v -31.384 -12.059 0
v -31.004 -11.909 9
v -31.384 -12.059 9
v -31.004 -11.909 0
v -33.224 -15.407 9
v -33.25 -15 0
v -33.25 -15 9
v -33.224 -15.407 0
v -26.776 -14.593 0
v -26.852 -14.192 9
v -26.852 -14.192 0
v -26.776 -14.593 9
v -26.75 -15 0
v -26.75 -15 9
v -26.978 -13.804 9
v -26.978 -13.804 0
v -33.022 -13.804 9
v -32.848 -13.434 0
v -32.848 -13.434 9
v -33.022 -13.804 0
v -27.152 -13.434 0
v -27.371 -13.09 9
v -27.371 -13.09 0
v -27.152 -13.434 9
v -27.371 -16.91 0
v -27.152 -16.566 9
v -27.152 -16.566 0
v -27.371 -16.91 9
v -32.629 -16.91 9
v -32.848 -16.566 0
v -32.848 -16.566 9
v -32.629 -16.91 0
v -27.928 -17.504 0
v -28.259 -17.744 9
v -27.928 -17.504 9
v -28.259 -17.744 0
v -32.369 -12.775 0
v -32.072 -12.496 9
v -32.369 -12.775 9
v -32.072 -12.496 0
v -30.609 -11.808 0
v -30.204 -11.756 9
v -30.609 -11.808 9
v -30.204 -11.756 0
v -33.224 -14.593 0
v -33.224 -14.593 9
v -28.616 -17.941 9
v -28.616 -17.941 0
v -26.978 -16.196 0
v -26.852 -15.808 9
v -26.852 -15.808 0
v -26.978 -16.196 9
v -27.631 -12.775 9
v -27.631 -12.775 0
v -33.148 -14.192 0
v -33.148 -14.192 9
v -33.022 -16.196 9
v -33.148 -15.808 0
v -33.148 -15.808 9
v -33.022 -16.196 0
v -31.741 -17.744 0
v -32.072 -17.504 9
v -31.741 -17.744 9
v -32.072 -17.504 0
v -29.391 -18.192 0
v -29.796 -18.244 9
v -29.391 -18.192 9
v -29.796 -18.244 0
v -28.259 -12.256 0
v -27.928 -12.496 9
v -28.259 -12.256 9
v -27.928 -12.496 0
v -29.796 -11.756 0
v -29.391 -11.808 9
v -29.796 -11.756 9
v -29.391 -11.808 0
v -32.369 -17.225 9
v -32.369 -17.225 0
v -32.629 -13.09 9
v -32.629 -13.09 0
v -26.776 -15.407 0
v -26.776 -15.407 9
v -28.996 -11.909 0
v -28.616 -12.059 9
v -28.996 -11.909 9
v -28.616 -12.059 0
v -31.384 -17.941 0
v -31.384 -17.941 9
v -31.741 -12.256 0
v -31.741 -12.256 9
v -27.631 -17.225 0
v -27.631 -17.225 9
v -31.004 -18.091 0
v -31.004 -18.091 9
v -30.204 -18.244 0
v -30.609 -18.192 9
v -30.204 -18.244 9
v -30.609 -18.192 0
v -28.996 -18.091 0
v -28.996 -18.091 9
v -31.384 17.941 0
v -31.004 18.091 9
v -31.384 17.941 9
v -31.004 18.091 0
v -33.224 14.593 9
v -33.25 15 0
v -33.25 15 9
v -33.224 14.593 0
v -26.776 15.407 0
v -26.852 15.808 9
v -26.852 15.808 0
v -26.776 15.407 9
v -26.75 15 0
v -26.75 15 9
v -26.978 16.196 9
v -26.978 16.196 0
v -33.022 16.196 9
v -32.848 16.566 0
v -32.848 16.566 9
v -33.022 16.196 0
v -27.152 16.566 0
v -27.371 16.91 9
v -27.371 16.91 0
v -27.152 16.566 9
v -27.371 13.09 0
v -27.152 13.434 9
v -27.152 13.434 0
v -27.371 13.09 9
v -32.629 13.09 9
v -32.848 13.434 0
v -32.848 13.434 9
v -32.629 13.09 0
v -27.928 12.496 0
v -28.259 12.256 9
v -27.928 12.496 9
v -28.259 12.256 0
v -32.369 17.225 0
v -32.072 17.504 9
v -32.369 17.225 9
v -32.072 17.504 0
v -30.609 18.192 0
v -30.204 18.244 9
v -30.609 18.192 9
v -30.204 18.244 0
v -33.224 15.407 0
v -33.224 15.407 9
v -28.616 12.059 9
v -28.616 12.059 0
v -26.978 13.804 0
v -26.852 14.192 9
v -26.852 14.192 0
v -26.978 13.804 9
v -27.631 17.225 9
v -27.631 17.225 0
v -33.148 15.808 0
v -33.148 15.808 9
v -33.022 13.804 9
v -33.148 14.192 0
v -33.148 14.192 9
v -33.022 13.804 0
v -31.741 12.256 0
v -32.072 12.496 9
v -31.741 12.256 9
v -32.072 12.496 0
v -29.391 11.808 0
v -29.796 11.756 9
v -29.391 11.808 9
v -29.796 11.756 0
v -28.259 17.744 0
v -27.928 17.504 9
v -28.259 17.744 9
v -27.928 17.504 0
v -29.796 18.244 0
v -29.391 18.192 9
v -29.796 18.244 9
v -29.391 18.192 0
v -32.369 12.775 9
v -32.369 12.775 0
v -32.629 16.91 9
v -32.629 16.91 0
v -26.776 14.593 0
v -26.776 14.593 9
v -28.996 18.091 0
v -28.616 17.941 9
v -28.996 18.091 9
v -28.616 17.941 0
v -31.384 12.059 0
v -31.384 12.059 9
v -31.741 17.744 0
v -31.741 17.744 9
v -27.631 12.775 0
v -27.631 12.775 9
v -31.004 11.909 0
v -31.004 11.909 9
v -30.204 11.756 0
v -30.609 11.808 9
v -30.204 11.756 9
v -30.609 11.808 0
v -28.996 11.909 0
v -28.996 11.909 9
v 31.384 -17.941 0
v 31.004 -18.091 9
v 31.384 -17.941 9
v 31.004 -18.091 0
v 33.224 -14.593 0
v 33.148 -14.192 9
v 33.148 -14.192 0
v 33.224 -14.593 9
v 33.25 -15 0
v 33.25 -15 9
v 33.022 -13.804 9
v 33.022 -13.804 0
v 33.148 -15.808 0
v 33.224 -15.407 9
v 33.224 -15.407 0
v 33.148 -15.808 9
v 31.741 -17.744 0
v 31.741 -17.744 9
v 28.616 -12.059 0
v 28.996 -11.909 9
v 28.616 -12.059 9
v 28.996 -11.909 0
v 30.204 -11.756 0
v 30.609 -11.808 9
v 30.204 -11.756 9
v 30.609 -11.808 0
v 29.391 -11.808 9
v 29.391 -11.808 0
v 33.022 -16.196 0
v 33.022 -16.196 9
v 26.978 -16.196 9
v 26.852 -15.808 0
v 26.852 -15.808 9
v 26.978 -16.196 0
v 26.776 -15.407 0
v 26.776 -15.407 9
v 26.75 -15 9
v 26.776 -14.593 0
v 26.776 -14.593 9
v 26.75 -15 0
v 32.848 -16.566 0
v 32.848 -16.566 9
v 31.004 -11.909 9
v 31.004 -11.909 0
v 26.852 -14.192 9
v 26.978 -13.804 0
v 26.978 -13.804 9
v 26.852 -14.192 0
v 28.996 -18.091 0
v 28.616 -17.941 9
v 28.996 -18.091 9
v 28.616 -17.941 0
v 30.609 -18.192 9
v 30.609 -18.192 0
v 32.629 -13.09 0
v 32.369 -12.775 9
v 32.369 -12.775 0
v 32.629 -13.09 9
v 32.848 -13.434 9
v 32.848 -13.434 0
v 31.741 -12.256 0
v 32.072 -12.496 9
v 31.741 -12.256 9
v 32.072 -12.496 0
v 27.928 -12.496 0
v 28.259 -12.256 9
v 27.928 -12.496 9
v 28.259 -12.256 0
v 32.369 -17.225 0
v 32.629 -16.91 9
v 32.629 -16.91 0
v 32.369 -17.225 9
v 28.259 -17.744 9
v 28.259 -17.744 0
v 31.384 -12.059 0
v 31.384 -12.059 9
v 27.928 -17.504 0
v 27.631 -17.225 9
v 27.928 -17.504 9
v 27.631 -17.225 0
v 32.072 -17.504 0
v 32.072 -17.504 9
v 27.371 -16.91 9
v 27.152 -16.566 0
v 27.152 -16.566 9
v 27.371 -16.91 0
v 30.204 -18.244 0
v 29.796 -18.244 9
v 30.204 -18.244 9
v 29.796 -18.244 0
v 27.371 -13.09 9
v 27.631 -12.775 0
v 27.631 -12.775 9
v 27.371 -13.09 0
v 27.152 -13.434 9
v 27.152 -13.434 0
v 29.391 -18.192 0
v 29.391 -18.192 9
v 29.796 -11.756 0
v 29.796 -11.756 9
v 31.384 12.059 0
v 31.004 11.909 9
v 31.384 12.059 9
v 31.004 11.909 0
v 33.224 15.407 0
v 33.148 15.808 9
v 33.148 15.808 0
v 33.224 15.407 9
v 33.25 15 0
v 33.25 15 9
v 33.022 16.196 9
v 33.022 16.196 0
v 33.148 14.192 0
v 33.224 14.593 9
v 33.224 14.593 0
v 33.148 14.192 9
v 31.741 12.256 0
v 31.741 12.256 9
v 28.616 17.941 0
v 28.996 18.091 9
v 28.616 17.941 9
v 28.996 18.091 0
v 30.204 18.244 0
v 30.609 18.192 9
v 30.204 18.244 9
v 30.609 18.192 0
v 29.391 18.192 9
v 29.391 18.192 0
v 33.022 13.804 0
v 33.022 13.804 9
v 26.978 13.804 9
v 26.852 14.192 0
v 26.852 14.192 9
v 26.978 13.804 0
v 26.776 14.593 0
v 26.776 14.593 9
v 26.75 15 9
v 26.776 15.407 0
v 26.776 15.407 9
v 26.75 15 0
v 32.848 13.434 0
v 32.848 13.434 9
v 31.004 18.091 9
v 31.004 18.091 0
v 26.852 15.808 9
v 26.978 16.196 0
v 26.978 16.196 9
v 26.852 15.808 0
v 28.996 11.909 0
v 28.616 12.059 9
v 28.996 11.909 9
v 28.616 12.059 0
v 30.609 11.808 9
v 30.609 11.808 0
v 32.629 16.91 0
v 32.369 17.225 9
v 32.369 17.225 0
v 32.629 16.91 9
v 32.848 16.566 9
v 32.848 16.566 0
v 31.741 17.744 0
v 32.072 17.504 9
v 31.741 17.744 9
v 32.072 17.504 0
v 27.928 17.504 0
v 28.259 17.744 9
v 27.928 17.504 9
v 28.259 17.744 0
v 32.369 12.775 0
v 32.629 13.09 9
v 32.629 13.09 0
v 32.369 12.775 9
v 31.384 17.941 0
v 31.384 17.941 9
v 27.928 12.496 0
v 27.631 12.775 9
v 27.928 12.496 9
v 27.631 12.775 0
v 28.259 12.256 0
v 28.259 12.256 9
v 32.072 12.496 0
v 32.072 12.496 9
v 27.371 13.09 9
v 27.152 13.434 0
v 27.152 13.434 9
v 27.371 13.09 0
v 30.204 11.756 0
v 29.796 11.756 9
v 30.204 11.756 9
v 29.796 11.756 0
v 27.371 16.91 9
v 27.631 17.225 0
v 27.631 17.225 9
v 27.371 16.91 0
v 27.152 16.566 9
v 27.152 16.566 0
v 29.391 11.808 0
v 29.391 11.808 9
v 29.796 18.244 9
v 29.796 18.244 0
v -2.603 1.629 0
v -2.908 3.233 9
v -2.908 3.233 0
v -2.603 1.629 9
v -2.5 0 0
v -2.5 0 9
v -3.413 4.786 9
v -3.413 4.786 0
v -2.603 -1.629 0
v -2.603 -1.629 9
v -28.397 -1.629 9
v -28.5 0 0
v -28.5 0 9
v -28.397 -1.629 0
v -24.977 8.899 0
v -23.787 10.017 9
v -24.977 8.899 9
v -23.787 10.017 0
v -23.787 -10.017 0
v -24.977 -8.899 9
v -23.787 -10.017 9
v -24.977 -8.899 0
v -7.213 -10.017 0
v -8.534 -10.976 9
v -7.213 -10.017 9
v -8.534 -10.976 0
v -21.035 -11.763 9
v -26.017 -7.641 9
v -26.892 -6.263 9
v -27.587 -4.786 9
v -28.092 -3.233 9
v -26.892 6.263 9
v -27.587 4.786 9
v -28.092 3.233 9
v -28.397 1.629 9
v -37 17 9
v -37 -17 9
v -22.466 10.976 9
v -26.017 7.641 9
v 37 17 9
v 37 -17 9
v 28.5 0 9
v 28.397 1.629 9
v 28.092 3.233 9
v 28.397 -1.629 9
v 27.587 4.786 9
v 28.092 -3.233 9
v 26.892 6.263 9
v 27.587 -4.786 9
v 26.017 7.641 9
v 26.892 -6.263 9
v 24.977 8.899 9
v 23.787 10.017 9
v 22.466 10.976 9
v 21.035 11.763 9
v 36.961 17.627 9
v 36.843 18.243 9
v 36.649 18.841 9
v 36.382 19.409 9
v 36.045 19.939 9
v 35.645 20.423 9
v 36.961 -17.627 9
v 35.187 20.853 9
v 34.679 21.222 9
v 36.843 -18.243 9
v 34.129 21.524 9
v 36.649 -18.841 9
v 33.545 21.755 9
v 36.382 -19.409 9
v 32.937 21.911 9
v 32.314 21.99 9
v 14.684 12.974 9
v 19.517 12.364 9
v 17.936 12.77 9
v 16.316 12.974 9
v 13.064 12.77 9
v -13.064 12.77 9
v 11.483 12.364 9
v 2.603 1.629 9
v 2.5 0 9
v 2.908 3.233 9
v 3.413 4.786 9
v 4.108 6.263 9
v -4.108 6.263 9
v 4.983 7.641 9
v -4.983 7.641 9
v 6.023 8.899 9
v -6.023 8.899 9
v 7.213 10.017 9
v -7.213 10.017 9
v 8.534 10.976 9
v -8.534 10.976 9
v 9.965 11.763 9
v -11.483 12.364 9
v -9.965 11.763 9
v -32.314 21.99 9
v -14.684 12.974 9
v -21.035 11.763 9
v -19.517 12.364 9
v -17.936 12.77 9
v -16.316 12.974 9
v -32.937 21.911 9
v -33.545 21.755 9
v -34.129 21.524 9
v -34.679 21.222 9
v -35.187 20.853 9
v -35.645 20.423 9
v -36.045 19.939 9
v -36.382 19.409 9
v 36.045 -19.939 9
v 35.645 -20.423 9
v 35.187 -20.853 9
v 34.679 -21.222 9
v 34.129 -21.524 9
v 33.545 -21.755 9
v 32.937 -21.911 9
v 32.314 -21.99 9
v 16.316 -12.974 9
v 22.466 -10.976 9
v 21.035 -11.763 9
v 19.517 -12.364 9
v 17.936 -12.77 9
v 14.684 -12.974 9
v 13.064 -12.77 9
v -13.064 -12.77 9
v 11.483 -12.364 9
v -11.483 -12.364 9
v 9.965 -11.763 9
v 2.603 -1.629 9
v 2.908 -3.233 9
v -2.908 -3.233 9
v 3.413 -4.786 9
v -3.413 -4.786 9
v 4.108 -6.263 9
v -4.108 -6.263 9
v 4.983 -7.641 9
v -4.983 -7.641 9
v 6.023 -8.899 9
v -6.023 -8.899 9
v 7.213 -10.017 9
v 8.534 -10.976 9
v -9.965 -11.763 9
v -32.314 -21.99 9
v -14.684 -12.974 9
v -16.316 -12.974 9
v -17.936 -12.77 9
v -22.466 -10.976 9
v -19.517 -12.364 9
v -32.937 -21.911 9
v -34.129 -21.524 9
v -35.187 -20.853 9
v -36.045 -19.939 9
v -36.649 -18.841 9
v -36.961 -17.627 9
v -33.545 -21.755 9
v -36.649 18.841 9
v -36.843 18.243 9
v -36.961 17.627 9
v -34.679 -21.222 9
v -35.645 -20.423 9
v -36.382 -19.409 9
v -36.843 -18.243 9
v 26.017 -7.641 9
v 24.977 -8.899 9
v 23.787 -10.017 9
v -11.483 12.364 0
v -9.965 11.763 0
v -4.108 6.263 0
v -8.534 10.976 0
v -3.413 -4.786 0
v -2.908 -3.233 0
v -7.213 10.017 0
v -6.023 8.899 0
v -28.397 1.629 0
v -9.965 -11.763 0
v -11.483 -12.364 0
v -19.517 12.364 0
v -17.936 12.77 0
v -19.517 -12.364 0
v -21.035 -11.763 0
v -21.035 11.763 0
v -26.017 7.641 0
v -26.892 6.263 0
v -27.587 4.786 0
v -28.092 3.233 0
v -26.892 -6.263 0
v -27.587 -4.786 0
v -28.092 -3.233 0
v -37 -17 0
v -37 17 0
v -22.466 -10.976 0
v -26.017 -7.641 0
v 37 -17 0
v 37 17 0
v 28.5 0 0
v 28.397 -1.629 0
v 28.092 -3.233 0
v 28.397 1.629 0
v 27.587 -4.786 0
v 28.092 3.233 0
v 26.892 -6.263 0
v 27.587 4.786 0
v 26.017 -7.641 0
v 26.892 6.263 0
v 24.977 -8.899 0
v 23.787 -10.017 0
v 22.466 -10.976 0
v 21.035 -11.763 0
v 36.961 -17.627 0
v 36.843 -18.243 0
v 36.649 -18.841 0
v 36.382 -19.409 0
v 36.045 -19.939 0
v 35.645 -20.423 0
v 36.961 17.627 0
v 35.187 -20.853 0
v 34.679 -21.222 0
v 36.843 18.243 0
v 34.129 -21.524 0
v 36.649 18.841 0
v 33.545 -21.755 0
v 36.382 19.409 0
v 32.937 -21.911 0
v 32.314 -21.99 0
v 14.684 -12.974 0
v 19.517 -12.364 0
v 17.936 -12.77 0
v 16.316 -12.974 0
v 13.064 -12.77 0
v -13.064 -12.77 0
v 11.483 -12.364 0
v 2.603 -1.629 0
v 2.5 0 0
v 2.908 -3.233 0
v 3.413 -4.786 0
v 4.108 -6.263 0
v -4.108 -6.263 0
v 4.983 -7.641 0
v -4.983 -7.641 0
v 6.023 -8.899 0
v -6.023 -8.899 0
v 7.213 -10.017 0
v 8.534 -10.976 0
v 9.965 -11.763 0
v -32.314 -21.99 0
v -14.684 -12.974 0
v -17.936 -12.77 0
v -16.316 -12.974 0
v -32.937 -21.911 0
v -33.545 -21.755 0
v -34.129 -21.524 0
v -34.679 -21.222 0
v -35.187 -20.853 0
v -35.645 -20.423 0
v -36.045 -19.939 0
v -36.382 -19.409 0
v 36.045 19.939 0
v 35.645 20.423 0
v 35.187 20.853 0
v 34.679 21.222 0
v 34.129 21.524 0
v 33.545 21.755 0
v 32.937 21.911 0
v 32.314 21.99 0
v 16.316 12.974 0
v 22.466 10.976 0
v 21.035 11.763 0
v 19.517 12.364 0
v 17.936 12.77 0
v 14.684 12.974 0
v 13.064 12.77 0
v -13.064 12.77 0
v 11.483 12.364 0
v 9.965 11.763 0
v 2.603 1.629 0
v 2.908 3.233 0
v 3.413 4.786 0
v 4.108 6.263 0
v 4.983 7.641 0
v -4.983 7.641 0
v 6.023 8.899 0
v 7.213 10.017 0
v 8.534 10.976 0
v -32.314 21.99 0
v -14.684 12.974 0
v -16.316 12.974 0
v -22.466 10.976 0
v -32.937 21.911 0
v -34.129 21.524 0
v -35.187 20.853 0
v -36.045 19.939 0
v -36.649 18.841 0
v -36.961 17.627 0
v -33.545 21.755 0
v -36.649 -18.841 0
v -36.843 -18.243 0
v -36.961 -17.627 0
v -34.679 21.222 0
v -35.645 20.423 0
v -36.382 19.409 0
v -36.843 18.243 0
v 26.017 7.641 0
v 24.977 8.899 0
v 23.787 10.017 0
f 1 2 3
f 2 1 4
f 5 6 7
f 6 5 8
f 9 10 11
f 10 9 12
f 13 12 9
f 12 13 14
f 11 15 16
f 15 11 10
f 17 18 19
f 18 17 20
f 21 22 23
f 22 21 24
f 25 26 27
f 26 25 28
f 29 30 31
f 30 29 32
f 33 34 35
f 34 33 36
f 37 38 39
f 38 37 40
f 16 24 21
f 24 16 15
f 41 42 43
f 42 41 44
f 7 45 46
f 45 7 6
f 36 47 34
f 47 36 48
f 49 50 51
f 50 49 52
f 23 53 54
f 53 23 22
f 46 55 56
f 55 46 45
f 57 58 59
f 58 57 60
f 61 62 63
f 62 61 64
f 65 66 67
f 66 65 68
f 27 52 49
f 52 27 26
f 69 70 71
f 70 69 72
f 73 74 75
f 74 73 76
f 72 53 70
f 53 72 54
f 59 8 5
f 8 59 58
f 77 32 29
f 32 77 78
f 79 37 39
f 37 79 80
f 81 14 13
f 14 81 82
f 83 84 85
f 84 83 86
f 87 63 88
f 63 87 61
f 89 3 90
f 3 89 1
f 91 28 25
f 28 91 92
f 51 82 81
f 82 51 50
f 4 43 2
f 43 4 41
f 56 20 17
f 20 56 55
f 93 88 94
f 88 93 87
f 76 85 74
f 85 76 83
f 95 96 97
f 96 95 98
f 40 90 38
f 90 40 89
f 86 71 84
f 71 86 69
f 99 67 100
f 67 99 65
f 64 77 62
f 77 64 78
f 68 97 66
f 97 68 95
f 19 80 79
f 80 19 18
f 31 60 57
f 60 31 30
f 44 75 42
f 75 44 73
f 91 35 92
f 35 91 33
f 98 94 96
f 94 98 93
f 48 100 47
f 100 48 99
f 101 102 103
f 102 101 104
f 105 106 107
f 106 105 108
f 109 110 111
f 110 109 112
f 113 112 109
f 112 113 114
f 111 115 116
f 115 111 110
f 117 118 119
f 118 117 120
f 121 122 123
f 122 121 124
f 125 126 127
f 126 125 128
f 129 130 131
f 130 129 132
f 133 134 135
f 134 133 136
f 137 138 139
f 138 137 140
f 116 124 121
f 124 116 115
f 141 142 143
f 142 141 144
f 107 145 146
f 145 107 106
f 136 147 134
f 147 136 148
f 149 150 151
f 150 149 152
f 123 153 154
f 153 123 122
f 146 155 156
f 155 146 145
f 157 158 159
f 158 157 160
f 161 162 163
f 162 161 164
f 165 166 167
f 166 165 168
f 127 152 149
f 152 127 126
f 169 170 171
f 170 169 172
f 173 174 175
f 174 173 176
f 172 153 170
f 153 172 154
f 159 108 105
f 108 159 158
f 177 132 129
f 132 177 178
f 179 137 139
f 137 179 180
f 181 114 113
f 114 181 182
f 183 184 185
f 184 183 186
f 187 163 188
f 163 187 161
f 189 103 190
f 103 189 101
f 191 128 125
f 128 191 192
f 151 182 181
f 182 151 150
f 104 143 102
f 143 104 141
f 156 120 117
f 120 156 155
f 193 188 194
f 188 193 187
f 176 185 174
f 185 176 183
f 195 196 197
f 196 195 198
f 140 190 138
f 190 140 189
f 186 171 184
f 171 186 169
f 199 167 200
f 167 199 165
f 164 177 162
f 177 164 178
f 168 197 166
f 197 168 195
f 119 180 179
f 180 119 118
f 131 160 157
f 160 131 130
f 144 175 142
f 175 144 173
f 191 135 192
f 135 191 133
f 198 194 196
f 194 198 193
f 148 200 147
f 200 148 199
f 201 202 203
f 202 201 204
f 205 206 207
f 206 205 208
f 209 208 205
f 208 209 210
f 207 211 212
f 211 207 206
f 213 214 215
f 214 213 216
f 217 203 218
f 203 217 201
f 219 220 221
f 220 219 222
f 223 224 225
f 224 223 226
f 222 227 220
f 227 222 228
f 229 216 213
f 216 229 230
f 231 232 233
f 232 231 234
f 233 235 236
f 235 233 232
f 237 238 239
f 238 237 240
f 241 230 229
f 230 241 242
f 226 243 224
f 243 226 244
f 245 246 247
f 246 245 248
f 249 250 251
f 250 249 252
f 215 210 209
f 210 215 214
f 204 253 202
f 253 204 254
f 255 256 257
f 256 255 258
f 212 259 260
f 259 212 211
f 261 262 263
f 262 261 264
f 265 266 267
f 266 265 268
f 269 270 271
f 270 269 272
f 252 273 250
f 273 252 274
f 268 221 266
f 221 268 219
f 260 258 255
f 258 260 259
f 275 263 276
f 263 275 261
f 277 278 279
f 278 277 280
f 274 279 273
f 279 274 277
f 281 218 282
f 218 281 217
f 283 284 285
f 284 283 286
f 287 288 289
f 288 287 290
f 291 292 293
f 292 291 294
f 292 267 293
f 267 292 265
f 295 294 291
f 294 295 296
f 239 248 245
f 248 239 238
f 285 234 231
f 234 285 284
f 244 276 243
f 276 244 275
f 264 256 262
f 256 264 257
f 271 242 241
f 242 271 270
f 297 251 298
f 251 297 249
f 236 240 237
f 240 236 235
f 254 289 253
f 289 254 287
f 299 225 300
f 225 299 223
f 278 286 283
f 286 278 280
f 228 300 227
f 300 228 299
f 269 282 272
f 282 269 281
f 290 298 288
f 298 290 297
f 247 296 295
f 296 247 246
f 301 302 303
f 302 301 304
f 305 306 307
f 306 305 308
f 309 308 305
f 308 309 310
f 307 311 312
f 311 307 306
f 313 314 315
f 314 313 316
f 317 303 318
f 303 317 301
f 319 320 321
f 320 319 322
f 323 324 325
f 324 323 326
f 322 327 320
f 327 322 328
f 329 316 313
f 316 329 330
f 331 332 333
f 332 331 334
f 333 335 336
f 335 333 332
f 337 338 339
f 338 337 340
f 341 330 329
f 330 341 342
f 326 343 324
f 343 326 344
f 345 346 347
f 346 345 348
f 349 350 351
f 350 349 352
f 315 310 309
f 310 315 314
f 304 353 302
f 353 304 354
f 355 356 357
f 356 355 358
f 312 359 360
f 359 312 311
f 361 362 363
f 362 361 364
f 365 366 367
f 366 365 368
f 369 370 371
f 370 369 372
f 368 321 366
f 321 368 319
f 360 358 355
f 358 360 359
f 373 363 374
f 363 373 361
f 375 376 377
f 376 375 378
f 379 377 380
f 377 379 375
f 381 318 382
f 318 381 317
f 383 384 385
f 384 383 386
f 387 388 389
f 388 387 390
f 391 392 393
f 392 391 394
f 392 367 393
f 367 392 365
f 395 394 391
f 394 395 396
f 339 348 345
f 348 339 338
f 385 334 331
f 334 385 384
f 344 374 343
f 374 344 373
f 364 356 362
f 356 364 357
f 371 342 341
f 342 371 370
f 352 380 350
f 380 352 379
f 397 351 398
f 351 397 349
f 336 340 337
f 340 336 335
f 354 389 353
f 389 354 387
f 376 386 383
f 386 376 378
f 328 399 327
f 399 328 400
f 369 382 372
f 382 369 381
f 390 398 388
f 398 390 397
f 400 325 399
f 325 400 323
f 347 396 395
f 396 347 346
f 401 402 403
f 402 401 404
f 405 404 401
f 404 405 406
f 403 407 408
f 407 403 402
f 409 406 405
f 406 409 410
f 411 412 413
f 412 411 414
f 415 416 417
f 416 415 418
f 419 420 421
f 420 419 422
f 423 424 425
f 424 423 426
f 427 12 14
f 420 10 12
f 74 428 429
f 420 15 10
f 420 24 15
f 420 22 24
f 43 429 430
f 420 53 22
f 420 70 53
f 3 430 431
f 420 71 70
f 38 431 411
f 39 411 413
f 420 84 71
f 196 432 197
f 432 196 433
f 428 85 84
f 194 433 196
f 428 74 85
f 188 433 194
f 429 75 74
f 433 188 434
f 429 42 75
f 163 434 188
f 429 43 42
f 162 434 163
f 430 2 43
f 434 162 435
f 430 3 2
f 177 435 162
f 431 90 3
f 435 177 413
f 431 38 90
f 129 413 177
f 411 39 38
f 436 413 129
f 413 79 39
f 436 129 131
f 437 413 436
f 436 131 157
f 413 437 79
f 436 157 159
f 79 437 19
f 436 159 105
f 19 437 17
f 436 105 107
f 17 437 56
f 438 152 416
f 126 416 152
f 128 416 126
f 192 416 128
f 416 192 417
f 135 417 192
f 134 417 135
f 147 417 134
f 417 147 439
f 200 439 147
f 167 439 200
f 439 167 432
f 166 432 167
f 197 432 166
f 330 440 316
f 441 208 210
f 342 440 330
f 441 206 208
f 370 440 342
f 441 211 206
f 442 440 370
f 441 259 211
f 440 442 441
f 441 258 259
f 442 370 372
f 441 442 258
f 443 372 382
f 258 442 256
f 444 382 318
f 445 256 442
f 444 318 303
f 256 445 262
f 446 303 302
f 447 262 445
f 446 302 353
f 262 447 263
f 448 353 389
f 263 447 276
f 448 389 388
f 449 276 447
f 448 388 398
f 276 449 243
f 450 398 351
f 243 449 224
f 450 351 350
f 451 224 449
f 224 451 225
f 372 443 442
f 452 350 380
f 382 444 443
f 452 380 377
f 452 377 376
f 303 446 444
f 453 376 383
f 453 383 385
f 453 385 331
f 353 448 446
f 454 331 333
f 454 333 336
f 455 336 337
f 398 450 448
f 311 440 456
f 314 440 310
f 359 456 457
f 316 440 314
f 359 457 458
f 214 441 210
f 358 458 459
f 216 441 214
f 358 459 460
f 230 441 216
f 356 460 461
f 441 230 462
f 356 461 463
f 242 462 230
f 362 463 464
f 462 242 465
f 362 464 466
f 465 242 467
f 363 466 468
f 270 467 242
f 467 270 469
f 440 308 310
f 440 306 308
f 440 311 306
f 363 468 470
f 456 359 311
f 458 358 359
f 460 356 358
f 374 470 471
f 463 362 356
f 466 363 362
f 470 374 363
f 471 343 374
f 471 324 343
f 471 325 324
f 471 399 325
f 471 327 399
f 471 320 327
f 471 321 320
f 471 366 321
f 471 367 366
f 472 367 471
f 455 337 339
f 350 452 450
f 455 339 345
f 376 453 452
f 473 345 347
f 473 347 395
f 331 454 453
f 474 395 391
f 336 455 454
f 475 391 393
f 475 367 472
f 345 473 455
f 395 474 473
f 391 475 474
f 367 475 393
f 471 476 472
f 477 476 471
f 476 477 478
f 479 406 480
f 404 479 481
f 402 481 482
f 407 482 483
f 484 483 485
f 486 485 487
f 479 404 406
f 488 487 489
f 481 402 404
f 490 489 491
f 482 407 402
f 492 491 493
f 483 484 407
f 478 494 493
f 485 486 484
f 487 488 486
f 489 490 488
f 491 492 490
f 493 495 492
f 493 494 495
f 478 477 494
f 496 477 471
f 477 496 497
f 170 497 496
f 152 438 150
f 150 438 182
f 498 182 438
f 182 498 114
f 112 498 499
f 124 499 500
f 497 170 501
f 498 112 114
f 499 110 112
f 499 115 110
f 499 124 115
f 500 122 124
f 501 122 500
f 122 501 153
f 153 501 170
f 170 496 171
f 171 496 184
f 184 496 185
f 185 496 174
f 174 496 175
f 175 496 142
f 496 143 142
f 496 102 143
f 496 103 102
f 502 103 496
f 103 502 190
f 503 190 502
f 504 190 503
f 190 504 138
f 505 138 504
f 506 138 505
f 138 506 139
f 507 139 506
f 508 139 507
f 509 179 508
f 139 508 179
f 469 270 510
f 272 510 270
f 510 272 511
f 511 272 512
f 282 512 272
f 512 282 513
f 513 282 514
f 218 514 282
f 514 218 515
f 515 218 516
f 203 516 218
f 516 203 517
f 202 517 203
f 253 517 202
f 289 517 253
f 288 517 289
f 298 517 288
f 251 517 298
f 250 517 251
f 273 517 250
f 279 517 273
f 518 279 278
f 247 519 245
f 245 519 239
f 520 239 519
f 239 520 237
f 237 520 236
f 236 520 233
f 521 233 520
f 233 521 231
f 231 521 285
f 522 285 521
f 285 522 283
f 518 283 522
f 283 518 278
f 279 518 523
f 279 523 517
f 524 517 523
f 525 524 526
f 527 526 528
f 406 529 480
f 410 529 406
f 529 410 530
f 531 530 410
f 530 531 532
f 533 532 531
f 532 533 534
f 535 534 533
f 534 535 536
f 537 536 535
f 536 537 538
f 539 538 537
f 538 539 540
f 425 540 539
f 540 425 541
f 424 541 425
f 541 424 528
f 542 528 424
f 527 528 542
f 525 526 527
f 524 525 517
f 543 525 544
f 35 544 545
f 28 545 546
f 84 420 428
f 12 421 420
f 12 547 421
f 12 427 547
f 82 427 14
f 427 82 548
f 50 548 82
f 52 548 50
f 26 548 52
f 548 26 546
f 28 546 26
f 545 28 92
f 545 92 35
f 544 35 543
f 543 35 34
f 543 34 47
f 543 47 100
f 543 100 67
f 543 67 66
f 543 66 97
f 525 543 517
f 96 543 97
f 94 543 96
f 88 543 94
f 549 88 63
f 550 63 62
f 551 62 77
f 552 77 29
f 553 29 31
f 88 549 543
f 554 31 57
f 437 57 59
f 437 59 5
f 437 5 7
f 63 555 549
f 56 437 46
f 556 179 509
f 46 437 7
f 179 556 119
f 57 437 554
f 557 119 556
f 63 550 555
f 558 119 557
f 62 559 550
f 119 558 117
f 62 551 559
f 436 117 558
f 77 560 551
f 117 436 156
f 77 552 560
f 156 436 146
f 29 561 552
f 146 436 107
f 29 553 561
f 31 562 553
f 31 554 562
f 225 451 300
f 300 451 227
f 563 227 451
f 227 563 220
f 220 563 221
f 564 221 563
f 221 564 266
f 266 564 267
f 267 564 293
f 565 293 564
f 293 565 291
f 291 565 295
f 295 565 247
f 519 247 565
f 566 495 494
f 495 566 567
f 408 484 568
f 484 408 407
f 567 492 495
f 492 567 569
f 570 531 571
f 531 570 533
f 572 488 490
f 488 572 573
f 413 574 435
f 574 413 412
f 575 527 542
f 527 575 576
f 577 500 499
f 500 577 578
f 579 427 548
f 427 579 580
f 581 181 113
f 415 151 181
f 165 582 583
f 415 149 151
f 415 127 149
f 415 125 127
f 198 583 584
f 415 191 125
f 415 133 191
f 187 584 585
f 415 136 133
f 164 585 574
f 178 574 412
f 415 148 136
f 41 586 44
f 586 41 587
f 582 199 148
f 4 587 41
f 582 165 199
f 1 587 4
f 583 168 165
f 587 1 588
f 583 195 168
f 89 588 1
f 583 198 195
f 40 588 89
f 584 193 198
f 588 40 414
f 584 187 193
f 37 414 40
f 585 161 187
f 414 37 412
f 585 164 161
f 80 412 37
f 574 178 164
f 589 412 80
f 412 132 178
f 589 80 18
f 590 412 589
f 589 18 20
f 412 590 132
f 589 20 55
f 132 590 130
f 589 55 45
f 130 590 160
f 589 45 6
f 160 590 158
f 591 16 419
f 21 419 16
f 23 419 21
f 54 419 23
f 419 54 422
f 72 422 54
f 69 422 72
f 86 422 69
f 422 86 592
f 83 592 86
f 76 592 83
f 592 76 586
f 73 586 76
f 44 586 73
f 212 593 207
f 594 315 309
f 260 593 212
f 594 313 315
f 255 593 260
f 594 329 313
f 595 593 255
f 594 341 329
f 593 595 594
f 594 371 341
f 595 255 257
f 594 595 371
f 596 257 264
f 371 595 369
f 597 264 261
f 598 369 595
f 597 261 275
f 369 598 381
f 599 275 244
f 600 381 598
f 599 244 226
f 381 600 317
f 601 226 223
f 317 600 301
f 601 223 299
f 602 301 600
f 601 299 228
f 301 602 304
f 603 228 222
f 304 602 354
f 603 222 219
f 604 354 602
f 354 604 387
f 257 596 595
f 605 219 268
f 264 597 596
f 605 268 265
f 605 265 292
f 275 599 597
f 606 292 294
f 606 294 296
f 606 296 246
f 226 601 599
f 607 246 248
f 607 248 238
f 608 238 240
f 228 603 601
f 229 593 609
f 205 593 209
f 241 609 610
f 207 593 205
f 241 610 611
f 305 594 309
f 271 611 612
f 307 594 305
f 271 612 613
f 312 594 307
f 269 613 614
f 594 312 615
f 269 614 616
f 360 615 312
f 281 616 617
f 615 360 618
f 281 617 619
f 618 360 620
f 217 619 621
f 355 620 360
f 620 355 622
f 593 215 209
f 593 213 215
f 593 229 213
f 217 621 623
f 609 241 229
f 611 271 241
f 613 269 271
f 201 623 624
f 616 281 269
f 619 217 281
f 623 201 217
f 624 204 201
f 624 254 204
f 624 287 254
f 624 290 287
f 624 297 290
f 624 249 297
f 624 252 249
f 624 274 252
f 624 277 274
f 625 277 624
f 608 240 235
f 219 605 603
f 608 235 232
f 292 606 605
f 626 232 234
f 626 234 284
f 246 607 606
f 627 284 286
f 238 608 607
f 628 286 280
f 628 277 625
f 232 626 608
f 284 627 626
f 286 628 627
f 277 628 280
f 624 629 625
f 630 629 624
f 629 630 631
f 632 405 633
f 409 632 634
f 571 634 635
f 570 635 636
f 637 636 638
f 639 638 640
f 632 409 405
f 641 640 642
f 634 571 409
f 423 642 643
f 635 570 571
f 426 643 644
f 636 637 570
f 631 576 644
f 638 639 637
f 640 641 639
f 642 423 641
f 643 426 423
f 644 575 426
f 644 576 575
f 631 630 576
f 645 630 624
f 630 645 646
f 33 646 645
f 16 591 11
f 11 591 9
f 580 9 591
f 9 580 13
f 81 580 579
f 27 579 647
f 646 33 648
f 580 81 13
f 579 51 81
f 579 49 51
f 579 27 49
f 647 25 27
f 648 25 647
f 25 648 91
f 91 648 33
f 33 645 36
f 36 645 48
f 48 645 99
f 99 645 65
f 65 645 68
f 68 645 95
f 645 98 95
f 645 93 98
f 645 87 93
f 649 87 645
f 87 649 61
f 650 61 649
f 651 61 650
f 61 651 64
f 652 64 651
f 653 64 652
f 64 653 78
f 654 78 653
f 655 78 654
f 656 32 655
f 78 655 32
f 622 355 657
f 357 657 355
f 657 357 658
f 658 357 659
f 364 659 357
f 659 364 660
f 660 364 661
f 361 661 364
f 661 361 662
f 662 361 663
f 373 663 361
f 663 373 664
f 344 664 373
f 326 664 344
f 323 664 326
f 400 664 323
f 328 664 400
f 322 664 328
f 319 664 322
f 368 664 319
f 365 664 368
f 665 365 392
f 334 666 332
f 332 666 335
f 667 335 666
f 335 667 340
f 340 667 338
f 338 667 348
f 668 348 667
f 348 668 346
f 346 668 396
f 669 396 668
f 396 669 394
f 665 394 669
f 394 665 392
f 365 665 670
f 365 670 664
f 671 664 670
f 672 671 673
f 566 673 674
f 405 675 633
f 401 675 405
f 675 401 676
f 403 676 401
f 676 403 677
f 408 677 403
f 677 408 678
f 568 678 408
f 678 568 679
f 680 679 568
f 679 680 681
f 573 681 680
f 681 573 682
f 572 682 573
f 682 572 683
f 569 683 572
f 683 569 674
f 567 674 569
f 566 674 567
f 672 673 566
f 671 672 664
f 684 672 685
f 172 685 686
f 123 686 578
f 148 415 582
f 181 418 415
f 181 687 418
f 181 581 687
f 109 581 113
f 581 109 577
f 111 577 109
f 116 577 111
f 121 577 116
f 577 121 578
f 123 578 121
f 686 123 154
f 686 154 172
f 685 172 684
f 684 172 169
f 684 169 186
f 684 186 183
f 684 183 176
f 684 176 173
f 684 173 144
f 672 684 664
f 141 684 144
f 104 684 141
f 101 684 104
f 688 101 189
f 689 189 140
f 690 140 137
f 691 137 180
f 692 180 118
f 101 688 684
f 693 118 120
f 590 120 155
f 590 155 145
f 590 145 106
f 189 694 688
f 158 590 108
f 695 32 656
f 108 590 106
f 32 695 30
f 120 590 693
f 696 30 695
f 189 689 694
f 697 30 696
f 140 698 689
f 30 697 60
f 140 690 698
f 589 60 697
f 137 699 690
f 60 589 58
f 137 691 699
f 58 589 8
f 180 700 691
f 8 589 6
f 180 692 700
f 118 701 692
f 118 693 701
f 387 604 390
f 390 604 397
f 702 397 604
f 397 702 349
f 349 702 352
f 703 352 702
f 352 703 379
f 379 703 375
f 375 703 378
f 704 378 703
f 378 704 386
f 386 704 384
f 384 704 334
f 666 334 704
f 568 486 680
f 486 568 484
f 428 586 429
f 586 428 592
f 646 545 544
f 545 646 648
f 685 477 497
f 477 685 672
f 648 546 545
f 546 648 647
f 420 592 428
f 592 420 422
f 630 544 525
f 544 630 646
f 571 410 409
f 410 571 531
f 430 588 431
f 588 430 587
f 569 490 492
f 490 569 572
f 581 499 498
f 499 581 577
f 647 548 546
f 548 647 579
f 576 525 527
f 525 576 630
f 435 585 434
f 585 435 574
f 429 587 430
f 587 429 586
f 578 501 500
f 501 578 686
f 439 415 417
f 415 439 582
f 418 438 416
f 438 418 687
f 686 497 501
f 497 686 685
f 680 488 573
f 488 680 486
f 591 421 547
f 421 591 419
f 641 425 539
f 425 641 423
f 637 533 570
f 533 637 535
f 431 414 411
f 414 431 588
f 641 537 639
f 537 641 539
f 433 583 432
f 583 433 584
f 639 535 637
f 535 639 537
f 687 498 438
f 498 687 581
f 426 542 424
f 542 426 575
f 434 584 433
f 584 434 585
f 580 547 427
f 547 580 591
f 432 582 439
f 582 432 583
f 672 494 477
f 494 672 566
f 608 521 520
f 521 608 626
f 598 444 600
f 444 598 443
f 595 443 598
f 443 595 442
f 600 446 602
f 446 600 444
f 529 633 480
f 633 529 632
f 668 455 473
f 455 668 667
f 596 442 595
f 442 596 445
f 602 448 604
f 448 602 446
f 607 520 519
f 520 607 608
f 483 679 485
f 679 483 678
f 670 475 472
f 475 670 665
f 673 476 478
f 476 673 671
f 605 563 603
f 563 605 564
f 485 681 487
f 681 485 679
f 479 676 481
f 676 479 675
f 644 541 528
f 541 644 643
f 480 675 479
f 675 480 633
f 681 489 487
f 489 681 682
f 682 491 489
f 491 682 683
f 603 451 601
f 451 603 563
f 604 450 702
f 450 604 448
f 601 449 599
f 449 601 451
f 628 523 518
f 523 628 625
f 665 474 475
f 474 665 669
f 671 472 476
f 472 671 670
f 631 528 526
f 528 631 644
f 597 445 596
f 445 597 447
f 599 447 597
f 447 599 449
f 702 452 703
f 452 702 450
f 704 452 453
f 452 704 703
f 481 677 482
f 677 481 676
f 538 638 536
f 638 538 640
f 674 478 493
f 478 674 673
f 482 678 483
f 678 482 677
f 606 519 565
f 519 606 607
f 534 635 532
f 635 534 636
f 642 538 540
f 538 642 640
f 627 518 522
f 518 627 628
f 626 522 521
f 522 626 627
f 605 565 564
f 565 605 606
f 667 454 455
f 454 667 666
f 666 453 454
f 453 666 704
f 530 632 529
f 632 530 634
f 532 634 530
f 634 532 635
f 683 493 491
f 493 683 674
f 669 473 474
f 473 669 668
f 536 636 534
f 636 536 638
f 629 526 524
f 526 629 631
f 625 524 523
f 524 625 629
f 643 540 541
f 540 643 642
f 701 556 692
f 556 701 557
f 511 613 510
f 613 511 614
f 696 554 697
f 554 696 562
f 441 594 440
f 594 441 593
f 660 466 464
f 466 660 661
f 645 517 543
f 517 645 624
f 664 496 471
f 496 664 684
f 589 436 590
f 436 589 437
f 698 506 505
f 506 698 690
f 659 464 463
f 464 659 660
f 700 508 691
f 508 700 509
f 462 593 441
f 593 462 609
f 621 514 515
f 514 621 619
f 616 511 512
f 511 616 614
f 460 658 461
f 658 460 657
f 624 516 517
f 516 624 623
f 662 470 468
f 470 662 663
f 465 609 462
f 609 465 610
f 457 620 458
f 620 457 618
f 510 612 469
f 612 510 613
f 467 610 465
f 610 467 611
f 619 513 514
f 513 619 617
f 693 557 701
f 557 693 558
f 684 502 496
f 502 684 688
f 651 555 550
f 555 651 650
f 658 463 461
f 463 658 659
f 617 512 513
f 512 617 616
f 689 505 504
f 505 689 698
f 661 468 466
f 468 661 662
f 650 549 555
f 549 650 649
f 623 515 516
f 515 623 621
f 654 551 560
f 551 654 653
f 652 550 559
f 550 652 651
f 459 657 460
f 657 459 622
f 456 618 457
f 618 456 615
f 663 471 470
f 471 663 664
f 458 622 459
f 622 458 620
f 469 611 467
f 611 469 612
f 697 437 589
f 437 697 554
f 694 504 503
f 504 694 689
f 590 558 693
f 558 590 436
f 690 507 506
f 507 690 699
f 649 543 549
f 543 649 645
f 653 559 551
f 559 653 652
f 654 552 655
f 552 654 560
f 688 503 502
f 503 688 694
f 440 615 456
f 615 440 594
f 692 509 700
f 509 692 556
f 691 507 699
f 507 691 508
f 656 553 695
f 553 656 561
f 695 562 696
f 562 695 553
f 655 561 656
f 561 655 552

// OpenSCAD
$fn = 50;

difference() {
	union() {
		hull() {
			translate(v = [-32.0, 17.0, 0]) {
				cylinder(h = 9, r = 5);
			}
			translate(v = [32.0, 17.0, 0]) {
				cylinder(h = 9, r = 5);
			}
			translate(v = [-32.0, -17.0, 0]) {
				cylinder(h = 9, r = 5);
			}
			translate(v = [32.0, -17.0, 0]) {
				cylinder(h = 9, r = 5);
			}
		}
	}
	union() {
		translate(v = [-30.0, -15.0, -100.0]) {
			cylinder(h = 200, r = 3.25);
		}
		translate(v = [-30.0, 15.0, -100.0]) {
			cylinder(h = 200, r = 3.25);
		}
		translate(v = [30.0, -15.0, -100.0]) {
			cylinder(h = 200, r = 3.25);
		}
		translate(v = [30.0, 15.0, -100.0]) {
			cylinder(h = 200, r = 3.25);
		}
		translate(v = [-30.0, -15.0, -100.0]) {
			cylinder(h = 200, r = 1.8);
		}
		translate(v = [-30.0, 15.0, -100.0]) {
			cylinder(h = 200, r = 1.8);
		}
		translate(v = [30.0, -15.0, -100.0]) {
			cylinder(h = 200, r = 1.8);
		}
		translate(v = [30.0, 15.0, -100.0]) {
			cylinder(h = 200, r = 1.8);
		}
		translate(v = [-15.5, 0, 0.0]) {
			cylinder(h = 9, r = 13.0);
		}
		translate(v = [15.5, 0, 0.0]) {
			cylinder(h = 9, r = 13.0);
		}
	}
}
